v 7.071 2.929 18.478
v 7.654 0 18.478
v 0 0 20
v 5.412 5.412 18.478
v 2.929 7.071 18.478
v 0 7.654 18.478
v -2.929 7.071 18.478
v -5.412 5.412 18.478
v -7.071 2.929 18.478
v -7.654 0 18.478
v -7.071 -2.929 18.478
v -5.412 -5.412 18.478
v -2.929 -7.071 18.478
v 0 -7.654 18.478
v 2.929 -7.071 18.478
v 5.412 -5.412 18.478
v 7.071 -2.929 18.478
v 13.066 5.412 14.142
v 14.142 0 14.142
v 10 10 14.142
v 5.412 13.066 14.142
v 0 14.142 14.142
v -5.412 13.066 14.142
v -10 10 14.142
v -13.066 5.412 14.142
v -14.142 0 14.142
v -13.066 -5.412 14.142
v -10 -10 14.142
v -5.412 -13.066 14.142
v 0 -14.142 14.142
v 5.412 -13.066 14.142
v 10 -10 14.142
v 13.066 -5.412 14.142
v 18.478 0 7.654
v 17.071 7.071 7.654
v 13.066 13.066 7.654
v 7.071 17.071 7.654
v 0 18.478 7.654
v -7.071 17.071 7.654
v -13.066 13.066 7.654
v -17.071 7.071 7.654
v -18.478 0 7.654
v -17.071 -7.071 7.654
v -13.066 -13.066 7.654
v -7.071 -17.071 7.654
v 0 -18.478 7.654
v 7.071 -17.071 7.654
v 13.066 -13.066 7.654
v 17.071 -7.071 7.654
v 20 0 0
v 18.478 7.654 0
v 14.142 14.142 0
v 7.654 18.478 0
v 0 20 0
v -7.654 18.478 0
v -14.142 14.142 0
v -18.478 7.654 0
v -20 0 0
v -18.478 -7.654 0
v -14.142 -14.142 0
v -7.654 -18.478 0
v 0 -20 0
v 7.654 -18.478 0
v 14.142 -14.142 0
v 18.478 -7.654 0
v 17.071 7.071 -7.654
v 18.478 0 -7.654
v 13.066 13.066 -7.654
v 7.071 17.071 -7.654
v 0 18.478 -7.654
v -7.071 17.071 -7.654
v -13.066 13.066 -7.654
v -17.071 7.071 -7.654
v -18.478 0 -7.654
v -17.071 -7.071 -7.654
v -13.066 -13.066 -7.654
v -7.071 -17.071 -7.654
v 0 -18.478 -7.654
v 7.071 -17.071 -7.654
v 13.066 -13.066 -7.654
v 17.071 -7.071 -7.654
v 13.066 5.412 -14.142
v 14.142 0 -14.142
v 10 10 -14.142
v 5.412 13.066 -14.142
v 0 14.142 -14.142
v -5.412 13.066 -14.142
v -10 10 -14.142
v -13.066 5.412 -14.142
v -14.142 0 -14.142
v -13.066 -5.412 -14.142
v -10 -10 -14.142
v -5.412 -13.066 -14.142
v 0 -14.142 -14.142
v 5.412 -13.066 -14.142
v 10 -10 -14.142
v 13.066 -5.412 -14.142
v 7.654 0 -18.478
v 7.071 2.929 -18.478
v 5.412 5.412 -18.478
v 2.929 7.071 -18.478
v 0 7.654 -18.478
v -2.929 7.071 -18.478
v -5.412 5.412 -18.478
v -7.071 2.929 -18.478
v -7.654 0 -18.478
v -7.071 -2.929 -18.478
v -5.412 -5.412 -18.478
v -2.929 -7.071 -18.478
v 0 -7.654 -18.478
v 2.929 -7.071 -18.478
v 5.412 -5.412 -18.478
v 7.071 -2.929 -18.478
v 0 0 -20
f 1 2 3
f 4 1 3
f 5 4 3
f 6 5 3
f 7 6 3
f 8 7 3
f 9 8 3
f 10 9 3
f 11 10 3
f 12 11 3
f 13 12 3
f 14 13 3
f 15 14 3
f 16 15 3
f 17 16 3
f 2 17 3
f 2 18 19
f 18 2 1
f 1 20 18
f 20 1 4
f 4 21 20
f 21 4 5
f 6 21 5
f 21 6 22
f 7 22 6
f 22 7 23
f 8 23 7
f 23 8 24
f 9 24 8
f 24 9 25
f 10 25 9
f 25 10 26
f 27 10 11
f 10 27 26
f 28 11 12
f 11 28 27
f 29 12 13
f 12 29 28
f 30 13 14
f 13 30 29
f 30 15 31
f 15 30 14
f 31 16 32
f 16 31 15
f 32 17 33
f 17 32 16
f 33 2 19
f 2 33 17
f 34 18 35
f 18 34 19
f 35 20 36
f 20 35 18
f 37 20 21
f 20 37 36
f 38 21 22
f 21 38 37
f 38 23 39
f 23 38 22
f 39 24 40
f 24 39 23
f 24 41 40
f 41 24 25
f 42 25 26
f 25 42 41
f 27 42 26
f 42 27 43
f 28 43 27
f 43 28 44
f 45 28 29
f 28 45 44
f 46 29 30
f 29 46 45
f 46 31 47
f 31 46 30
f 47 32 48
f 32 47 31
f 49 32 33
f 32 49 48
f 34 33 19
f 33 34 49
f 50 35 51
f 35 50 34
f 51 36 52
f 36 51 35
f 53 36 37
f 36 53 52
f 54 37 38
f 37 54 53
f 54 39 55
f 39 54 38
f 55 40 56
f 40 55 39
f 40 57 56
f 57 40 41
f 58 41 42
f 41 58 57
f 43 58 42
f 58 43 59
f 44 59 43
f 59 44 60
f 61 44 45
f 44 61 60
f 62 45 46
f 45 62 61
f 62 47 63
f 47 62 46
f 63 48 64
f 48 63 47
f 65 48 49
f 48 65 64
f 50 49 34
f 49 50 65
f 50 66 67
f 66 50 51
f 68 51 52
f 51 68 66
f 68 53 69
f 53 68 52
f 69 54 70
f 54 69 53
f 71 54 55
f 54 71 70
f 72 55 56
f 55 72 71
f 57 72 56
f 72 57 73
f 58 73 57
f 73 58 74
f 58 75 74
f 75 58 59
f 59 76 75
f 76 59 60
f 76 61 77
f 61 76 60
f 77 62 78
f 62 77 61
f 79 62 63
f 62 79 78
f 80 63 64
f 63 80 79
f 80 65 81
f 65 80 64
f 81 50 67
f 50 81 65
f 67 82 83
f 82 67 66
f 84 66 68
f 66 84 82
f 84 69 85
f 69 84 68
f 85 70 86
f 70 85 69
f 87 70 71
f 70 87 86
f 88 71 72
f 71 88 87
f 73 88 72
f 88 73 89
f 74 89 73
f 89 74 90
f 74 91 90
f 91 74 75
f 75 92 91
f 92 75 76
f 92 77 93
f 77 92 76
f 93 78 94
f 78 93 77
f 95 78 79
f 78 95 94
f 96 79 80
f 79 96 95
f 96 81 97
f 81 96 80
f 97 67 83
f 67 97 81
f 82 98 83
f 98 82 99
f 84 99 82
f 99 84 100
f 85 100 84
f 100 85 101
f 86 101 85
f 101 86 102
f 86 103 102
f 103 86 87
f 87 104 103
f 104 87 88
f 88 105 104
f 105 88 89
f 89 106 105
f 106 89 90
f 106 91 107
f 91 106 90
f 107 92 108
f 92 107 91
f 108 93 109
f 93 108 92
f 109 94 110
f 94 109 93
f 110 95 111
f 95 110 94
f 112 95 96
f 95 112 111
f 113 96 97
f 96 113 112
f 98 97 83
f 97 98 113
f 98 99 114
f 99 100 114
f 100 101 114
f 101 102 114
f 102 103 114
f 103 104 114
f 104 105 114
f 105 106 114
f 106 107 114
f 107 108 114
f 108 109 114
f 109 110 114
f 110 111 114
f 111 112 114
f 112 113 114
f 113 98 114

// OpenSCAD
// D3 — a polyhedron sampling a smooth surface. Every declared face interns its
// own patch, so without a merge rule this dome drew all 240 of its tessellation
// edges; the same defect took a 128 x 34 lamp shade to 17 536.
n = 16;
m = 8;
verts = concat(
  [[0, 0, 20]],
  [for (j = [1:m - 1], i = [0:n - 1])
      let (p = j * 180 / m, t = i * 360 / n)
      [20 * sin(p) * cos(t), 20 * sin(p) * sin(t), 20 * cos(p)]],
  [[0, 0, -20]]
);
top = [for (i = [0:n - 1]) [0, 1 + i, 1 + (i + 1) % n]];
bands = [for (j = [0:m - 3], i = [0:n - 1])
  [1 + j * n + i, 1 + (j + 1) * n + i, 1 + (j + 1) * n + (i + 1) % n, 1 + j * n + (i + 1) % n]];
bot = [for (i = [0:n - 1])
  [len(verts) - 1, 1 + (m - 2) * n + (i + 1) % n, 1 + (m - 2) * n + i]];
polyhedron(points = verts, faces = concat(top, bands, bot));
